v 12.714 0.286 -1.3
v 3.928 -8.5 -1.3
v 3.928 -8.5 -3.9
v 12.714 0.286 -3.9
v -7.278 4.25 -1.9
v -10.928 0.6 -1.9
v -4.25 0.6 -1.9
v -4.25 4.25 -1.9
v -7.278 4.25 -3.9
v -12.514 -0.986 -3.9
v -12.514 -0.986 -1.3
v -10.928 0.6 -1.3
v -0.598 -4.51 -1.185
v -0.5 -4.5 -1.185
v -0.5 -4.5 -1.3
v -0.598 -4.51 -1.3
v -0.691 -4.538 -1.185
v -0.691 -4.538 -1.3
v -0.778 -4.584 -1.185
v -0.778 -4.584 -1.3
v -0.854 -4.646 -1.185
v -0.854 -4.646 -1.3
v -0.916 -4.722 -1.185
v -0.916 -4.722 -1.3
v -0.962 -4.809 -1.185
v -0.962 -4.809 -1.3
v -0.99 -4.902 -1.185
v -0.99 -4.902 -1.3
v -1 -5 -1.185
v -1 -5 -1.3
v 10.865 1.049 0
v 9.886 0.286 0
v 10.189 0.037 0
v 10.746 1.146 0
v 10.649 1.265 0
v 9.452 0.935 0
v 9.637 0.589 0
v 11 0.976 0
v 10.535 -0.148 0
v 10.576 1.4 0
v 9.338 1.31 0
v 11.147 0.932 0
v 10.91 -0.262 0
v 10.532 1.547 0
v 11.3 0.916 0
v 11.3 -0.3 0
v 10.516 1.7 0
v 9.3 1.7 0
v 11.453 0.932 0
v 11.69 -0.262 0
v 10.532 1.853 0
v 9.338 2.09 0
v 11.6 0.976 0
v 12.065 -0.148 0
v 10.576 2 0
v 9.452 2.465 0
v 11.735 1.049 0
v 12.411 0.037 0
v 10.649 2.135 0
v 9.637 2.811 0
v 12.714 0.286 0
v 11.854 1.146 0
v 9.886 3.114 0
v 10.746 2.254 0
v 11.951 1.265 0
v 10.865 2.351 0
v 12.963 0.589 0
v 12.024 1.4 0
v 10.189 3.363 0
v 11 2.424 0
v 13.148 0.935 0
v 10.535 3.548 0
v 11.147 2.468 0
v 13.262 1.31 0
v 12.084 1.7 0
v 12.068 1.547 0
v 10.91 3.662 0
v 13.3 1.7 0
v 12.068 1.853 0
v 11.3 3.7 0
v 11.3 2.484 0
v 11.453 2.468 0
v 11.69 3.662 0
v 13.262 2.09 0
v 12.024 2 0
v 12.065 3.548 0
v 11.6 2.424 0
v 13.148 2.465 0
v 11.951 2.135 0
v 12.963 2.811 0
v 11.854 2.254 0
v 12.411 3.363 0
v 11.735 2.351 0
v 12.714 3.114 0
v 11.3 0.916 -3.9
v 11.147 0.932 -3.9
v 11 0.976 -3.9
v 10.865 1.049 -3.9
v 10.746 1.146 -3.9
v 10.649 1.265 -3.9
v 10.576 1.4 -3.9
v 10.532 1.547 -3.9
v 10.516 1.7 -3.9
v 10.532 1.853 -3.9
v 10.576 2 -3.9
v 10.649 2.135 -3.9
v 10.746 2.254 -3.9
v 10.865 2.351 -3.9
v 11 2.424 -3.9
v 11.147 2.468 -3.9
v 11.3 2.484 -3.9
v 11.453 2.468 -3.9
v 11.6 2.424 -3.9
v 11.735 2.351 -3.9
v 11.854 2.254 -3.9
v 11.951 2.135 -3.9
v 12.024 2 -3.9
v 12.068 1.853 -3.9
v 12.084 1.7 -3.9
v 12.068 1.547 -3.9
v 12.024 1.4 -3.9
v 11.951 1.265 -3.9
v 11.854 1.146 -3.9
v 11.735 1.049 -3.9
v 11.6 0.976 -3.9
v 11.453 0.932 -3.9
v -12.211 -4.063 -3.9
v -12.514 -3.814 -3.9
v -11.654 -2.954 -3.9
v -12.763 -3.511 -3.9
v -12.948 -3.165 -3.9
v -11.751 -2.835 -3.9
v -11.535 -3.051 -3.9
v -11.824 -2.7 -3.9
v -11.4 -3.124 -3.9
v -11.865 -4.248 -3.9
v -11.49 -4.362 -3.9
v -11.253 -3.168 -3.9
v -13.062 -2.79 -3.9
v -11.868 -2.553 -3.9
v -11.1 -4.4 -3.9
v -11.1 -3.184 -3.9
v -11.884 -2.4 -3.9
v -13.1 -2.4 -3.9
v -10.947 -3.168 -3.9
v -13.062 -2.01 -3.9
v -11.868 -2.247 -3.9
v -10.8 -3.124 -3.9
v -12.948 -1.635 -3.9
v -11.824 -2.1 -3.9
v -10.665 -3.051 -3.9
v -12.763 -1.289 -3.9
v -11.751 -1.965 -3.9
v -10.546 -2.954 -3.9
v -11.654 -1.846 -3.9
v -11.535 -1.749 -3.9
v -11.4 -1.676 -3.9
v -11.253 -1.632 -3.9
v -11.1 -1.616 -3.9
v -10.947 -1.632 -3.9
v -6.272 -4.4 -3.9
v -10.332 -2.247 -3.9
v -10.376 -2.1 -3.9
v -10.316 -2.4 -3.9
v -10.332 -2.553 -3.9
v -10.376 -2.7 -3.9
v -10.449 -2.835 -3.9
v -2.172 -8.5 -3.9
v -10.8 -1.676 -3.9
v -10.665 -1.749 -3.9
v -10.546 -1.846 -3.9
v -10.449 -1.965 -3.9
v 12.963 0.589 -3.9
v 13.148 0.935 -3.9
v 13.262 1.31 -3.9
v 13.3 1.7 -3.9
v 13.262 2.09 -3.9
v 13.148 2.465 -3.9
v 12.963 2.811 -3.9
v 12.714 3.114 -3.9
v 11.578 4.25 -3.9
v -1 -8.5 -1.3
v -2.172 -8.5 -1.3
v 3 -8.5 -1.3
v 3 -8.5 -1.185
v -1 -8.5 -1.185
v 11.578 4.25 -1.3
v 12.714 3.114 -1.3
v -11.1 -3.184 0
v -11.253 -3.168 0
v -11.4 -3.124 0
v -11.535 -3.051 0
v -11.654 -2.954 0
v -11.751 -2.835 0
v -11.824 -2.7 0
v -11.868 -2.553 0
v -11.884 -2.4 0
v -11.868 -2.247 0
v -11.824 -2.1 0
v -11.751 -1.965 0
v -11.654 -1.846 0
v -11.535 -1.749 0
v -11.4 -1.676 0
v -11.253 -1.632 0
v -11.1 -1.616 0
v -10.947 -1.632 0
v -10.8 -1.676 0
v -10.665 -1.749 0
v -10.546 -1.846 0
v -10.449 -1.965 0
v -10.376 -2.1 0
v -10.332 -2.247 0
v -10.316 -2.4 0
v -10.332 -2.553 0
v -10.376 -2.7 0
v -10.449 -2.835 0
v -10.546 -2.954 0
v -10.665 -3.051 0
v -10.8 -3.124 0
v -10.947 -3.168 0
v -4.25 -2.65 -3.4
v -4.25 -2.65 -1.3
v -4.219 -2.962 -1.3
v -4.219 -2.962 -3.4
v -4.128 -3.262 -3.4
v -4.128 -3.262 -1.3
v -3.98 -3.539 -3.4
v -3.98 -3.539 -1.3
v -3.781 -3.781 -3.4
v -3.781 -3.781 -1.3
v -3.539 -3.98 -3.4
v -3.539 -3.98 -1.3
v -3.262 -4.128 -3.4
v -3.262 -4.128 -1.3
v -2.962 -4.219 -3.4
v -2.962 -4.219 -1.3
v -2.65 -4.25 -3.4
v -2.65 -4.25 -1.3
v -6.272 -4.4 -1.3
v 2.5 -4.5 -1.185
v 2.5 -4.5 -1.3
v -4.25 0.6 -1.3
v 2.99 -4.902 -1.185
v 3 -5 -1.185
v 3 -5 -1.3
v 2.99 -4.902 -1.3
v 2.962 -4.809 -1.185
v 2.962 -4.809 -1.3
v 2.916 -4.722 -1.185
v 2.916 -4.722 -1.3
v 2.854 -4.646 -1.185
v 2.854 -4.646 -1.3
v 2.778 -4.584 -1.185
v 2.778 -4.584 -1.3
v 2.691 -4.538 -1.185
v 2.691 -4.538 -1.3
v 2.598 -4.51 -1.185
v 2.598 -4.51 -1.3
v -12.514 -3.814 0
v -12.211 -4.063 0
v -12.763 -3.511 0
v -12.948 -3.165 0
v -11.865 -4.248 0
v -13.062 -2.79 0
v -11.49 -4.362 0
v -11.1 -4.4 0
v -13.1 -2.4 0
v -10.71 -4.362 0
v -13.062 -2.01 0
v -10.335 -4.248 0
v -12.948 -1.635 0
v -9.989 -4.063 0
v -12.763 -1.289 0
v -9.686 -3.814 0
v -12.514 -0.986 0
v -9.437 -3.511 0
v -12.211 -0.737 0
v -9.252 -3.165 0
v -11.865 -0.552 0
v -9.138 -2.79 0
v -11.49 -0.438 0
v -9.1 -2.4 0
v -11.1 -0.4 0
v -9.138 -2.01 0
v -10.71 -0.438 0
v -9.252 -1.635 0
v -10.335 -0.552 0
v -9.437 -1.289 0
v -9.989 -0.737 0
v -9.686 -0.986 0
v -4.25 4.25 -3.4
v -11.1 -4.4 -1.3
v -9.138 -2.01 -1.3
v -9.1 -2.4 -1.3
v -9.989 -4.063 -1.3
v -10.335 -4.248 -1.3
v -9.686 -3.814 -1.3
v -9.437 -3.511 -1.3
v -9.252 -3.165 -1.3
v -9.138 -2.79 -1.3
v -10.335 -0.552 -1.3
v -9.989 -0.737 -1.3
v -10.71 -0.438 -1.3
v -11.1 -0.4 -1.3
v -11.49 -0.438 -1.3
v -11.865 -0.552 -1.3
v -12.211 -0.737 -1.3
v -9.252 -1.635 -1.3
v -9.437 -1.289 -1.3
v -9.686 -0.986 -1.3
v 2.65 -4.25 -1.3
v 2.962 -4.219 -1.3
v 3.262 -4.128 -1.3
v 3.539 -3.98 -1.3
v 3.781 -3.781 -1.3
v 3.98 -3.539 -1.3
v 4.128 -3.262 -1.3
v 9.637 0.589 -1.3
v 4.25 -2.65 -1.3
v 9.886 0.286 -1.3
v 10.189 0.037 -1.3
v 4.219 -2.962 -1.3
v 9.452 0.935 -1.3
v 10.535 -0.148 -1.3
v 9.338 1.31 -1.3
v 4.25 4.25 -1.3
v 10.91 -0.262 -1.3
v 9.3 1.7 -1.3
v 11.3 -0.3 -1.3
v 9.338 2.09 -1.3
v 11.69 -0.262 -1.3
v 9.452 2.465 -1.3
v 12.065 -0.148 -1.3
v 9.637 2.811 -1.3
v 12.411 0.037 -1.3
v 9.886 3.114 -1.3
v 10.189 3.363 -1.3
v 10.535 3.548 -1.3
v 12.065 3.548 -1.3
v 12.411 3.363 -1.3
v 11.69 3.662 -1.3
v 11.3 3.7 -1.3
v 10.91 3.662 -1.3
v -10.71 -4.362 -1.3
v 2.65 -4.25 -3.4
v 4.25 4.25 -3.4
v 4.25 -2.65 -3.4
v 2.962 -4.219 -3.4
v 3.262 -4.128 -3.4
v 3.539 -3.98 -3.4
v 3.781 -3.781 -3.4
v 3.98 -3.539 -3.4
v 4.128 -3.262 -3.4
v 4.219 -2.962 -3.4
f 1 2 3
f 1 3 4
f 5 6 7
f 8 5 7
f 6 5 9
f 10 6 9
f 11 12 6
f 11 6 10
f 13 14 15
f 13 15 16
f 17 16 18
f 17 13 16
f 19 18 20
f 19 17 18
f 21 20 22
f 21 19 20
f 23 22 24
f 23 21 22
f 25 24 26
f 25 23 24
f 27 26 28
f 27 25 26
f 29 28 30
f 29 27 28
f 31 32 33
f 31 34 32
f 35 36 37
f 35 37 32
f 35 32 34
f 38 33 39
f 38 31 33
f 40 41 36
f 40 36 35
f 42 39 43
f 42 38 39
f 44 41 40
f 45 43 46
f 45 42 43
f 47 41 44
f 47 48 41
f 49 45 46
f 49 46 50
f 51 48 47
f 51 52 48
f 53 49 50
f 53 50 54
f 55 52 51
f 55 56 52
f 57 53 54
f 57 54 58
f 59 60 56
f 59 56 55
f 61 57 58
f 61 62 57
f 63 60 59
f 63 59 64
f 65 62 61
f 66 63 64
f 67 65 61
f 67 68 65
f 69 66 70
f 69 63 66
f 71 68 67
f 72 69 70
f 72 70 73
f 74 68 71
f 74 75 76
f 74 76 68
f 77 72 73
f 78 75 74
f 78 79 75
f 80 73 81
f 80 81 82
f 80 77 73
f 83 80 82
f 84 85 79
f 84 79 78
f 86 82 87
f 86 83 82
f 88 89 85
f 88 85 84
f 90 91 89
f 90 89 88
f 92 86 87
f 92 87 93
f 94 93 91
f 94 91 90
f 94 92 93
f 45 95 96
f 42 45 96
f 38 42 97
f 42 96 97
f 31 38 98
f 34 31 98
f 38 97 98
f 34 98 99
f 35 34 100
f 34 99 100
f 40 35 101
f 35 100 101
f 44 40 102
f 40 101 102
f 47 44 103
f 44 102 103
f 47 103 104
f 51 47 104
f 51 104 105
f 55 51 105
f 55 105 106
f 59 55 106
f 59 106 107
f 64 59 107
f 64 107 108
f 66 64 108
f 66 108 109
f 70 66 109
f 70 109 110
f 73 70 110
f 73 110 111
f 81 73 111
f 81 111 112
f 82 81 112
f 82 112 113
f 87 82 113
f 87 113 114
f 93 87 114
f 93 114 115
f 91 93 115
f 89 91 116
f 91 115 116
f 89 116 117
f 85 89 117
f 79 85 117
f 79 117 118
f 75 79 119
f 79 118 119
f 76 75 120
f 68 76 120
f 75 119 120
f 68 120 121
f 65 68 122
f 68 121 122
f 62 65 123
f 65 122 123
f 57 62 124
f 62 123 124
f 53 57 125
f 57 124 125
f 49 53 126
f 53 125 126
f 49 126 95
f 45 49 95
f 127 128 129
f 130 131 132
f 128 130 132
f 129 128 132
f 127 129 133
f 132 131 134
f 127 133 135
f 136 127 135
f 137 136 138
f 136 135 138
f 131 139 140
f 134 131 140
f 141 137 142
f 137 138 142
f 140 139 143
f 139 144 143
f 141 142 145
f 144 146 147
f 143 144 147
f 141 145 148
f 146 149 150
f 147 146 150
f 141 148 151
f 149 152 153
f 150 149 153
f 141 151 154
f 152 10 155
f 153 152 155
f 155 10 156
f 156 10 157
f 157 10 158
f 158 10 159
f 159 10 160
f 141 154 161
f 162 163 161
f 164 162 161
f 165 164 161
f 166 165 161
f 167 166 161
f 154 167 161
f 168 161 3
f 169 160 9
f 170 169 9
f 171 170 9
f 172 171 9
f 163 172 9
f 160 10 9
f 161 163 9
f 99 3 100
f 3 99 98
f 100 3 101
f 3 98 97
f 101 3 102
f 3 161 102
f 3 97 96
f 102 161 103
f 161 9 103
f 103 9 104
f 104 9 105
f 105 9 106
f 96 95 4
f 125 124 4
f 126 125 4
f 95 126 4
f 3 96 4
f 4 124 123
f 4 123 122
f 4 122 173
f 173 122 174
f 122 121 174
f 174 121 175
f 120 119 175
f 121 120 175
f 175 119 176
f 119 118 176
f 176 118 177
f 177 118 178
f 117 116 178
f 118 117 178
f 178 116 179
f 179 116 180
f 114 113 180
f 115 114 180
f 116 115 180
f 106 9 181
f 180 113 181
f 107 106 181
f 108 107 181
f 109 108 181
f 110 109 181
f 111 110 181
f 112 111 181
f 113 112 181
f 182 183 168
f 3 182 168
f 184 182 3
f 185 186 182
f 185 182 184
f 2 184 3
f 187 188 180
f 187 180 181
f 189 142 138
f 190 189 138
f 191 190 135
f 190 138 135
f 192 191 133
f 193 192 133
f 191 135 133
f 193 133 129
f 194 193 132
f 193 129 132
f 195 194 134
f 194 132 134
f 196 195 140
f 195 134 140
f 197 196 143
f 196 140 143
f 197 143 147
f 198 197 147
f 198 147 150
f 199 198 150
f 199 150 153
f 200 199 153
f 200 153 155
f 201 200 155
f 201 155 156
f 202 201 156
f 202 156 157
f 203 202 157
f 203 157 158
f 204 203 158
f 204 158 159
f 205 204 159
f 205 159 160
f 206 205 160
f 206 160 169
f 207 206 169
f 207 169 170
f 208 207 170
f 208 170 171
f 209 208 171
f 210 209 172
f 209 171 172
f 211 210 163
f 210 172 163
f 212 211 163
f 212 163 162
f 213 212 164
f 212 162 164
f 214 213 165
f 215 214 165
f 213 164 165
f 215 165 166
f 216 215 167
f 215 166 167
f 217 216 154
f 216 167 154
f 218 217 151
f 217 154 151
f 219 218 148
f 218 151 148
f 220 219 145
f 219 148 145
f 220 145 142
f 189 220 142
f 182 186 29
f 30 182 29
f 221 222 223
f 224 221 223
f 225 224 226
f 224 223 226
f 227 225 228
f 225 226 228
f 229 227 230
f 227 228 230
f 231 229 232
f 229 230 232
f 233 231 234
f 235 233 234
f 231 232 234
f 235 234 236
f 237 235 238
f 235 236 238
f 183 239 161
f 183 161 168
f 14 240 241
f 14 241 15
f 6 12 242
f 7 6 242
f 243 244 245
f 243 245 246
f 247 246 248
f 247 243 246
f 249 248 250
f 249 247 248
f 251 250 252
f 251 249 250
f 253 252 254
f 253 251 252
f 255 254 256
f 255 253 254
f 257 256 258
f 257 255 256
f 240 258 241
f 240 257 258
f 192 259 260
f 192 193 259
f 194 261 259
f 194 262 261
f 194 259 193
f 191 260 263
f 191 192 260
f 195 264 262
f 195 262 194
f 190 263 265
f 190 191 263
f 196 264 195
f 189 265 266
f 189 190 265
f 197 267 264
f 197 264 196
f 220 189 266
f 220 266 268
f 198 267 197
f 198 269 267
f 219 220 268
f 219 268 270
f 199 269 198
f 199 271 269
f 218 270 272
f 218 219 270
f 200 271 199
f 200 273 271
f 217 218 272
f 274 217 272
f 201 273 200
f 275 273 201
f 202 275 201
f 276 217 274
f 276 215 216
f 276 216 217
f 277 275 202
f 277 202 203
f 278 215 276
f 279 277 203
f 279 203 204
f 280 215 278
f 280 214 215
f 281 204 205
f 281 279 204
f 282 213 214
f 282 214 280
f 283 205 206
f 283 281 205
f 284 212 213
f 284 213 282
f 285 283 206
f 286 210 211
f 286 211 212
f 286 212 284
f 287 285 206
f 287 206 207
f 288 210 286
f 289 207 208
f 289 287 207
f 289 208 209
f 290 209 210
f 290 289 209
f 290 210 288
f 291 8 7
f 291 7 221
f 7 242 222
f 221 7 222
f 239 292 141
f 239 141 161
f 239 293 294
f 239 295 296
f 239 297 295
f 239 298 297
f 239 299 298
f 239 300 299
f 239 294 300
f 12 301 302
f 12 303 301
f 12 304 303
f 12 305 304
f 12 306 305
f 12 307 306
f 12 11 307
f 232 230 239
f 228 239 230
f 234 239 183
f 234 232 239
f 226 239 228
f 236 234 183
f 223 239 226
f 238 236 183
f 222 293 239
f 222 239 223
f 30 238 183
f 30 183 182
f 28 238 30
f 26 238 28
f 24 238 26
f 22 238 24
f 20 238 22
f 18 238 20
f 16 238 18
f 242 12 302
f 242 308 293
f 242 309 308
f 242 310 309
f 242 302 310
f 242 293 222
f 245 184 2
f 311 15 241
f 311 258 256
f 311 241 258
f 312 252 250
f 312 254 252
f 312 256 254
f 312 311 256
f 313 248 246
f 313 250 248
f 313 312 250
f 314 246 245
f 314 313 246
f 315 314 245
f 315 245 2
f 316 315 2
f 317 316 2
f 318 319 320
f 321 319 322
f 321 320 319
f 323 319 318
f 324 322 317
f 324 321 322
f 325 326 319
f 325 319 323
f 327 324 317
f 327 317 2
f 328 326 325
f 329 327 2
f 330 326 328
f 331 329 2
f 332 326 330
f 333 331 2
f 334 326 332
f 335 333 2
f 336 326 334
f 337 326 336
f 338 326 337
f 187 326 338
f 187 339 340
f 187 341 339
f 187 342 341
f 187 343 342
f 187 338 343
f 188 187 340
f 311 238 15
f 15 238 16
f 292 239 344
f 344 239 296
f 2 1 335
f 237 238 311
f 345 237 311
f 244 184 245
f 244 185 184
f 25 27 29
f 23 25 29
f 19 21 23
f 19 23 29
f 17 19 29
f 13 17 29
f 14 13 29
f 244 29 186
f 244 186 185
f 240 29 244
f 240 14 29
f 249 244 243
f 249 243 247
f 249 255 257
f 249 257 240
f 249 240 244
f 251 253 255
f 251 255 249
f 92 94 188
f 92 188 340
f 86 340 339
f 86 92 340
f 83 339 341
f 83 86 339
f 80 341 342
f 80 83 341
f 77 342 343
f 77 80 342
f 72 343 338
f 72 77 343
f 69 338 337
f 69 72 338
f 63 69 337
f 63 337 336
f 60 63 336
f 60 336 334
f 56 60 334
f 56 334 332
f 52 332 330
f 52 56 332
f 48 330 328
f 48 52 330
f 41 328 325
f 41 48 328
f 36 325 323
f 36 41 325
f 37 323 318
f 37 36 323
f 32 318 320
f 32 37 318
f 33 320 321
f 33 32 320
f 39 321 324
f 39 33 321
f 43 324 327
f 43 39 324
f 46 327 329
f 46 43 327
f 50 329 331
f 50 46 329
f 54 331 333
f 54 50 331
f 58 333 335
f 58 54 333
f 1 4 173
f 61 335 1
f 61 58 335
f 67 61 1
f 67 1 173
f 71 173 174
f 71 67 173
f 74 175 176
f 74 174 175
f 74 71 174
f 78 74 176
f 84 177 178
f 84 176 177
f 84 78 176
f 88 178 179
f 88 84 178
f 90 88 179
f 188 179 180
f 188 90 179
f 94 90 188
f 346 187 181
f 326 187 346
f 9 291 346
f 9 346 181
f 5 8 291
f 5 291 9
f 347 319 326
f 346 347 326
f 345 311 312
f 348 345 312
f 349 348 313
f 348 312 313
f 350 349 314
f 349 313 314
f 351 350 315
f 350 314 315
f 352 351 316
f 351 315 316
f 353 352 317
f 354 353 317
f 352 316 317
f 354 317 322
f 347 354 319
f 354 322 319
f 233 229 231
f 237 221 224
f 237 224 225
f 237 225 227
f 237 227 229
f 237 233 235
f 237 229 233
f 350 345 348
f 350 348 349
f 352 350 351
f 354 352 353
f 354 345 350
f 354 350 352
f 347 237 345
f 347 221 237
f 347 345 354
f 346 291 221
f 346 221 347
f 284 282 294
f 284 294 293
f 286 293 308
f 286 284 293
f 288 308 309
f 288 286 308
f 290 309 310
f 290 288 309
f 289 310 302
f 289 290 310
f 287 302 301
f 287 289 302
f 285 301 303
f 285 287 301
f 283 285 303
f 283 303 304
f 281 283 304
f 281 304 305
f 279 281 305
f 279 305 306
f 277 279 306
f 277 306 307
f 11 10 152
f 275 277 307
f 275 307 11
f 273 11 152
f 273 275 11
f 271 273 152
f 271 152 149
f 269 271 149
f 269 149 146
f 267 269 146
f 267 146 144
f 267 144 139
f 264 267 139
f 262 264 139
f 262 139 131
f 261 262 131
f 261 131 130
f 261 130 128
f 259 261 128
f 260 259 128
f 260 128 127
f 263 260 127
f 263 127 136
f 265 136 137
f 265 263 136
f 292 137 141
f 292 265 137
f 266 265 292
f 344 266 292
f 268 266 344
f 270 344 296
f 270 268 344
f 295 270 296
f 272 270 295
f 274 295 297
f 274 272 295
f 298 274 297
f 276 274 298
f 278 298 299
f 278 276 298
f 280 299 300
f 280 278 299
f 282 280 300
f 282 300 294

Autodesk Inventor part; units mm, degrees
ref_plane "YZ Plane" through (0, 0, 0) normal (1, 0, 0) x (0, 1, 0)
ref_plane "XZ Plane" through (0, 0, 0) normal (0, 1, 0) x (-1, 0, 0)
ref_plane "XY Plane" through (0, 0, 0) normal (0, 0, 1) x (1, 0, 0)
sketch "Sketch1" plane through (0, 0, 0) normal (0, 0, 1) x (1, 0, 0)
  line L0 (3.75, -3.75) -> (-3.75, -3.75) construction
  line L1 (-3.75, -3.75) -> (-3.75, 3.75) construction
  line L2 (-3.75, 3.75) -> (3.75, 3.75) construction
  line L3 (3.75, 3.75) -> (3.75, -3.75) construction
  line L4 (3.75, -3.75) -> (-3.75, 3.75) construction
  line L5 (-3.75, -3.75) -> (3.75, 3.75) construction
  line L6 (-6.9, -3.15) -> (-4.9, -3.15) construction
  line L7 (-4.9, -3.15) -> (-4.9, -1.15) construction
  line L8 (-4.9, -1.15) -> (-6.9, -1.15) construction
  line L9 (-6.9, -1.15) -> (-6.9, -3.15) construction
  line L10 (-6.9, -3.15) -> (-4.9, -1.15) construction
  line L11 (-4.9, -3.15) -> (-6.9, -1.15) construction
  line L12 (-0.5, -8) -> (2.5, -8) construction
  line L13 (2.5, -8) -> (2.5, -5) construction
  line L14 (2.5, -5) -> (-0.5, -5) construction
  line L15 (-0.5, -5) -> (-0.5, -8) construction
  line L16 (-0.5, -8) -> (2.5, -5) construction
  line L17 (2.5, -8) -> (-0.5, -5) construction
  circle A0 centre (-11.1, -2.4) radius 1.1
  circle A1 centre (-11.1, -2.4) radius 2
  circle A2 centre (11.3, 1.7) radius 1.1
  circle A3 centre (11.3, 1.7) radius 2
  line L18 (-2.1716, -8.5) -> (3.9284, -8.5)
  line L19 (3.9284, -8.5) -> (12.7142, 0.2858)
  line L20 (12.7142, 3.1142) -> (11.5784, 4.25)
  line L21 (11.5784, 4.25) -> (-7.2784, 4.25)
  line L22 (-7.2784, 4.25) -> (-12.5142, -0.9858)
  line L23 (-12, -7.9) -> (-9, -7.9) construction
  line L24 (-9, -7.9) -> (-9, -4.9) construction
  line L25 (-9, -4.9) -> (-12, -4.9) construction
  line L26 (-12, -4.9) -> (-12, -7.9) construction
  line L27 (-12, -7.9) -> (-9, -4.9) construction
  line L28 (-9, -7.9) -> (-12, -4.9) construction
  line L29 (-11.1, -4.4) -> (-6.2716, -4.4)
  line L30 (-6.2716, -4.4) -> (-2.1716, -8.5)
  line L31 (-4.25, 4.25) -> (-4.25, -2.65)
  arc A4 (-4.25, -2.65) -> (-2.65, -4.25) centre (-2.65, -2.65) ccw
  line L32 (-2.65, -4.25) -> (2.65, -4.25)
  arc A5 (2.65, -4.25) -> (4.25, -2.65) centre (2.65, -2.65) ccw
  line L33 (4.25, -2.65) -> (4.25, 4.25)
  line L34 (-10.9284, 0.6) -> (-4.25, 0.6)
  line L35 (3, -8.5) -> (3, -5)
  arc A6 (3, -5) -> (2.5, -4.5) centre (2.5, -5) ccw
  line L36 (-1, -8.5) -> (-1, -5)
  line L37 (2.5, -4.5) -> (-0.5, -4.5)
  arc A7 (-0.5, -4.5) -> (-1, -5) centre (-0.5, -5) ccw
  point P0 (0, 0)
  point P1 (-5.9, -2.15)
  point P2 (1, -6.5)
  point P3 (-10.5, -6.4)
  dimension "d0" = 6.5
  dimension "d1" = 1
  dimension "d2" = 5.9
  dimension "d3" = 2.15
  dimension "d4" = 7.5
  dimension "d5" = 3
  dimension "d6" = 2
  dimension "d7" = 2.2
  dimension "d8" = 4
  dimension "d9" = 11.1
  dimension "d10" = 2.4
  dimension "d11" = 11.3
  dimension "d12" = 1.7
  dimension "d16" = 0.5
  dimension "d17" = 0.5
  dimension "d20" = 10.5
  dimension "d21" = 6.4
  dimension "d22" = 3
  dimension "d23" = 135
  dimension "d24" = 1.6
  dimension "d25" = 0.5
  dimension "d28" = 3
extrude "Extrusion1" add sketch "Sketch1" against normal blind 3.9 contours A0 | A1 | A1 L22 L34 L31 A4 L32 A5 L33 L21 L20 A3 L19 L18 L35 A6 L37 A7 L36 L30 L29 | L22 L21 L31 L34 | L31 L21 L33 A5 L32 A4 | L36 A7 L37 A6 L35 L18 | A3 | A2
extrude "Extrusion2" cut sketch "Sketch1" against normal blind 3.4 contours L31 L21 L33 A5 L32 A4
extrude "Extrusion3" cut sketch "Sketch1" against normal blind 1.9 contours L22 L21 L31 L34
extrude "Extrusion4" cut sketch "Sketch1" against normal blind 1.3 contours A1 L22 L34 L31 A4 L32 A5 L33 L21 L20 A3 L19 L18 L35 A6 L37 A7 L36 L30 L29
extrude "Extrusion5" cut sketch "Sketch1" against normal blind 1.185 contours L36 A7 L37 A6 L35 L18
hole "Hole1" at (-11.1, -2.4, 0) at (11.3, 1.7, 0) direction (0, 0, -1) diameter 1.567 end through all thread size "M2x0.4" class "6H" standard "ANSI Metric M Profile"
equation "\"d17\" = d16"
properties part number "EPS_RegulatorHeatsink" material "Copper"
